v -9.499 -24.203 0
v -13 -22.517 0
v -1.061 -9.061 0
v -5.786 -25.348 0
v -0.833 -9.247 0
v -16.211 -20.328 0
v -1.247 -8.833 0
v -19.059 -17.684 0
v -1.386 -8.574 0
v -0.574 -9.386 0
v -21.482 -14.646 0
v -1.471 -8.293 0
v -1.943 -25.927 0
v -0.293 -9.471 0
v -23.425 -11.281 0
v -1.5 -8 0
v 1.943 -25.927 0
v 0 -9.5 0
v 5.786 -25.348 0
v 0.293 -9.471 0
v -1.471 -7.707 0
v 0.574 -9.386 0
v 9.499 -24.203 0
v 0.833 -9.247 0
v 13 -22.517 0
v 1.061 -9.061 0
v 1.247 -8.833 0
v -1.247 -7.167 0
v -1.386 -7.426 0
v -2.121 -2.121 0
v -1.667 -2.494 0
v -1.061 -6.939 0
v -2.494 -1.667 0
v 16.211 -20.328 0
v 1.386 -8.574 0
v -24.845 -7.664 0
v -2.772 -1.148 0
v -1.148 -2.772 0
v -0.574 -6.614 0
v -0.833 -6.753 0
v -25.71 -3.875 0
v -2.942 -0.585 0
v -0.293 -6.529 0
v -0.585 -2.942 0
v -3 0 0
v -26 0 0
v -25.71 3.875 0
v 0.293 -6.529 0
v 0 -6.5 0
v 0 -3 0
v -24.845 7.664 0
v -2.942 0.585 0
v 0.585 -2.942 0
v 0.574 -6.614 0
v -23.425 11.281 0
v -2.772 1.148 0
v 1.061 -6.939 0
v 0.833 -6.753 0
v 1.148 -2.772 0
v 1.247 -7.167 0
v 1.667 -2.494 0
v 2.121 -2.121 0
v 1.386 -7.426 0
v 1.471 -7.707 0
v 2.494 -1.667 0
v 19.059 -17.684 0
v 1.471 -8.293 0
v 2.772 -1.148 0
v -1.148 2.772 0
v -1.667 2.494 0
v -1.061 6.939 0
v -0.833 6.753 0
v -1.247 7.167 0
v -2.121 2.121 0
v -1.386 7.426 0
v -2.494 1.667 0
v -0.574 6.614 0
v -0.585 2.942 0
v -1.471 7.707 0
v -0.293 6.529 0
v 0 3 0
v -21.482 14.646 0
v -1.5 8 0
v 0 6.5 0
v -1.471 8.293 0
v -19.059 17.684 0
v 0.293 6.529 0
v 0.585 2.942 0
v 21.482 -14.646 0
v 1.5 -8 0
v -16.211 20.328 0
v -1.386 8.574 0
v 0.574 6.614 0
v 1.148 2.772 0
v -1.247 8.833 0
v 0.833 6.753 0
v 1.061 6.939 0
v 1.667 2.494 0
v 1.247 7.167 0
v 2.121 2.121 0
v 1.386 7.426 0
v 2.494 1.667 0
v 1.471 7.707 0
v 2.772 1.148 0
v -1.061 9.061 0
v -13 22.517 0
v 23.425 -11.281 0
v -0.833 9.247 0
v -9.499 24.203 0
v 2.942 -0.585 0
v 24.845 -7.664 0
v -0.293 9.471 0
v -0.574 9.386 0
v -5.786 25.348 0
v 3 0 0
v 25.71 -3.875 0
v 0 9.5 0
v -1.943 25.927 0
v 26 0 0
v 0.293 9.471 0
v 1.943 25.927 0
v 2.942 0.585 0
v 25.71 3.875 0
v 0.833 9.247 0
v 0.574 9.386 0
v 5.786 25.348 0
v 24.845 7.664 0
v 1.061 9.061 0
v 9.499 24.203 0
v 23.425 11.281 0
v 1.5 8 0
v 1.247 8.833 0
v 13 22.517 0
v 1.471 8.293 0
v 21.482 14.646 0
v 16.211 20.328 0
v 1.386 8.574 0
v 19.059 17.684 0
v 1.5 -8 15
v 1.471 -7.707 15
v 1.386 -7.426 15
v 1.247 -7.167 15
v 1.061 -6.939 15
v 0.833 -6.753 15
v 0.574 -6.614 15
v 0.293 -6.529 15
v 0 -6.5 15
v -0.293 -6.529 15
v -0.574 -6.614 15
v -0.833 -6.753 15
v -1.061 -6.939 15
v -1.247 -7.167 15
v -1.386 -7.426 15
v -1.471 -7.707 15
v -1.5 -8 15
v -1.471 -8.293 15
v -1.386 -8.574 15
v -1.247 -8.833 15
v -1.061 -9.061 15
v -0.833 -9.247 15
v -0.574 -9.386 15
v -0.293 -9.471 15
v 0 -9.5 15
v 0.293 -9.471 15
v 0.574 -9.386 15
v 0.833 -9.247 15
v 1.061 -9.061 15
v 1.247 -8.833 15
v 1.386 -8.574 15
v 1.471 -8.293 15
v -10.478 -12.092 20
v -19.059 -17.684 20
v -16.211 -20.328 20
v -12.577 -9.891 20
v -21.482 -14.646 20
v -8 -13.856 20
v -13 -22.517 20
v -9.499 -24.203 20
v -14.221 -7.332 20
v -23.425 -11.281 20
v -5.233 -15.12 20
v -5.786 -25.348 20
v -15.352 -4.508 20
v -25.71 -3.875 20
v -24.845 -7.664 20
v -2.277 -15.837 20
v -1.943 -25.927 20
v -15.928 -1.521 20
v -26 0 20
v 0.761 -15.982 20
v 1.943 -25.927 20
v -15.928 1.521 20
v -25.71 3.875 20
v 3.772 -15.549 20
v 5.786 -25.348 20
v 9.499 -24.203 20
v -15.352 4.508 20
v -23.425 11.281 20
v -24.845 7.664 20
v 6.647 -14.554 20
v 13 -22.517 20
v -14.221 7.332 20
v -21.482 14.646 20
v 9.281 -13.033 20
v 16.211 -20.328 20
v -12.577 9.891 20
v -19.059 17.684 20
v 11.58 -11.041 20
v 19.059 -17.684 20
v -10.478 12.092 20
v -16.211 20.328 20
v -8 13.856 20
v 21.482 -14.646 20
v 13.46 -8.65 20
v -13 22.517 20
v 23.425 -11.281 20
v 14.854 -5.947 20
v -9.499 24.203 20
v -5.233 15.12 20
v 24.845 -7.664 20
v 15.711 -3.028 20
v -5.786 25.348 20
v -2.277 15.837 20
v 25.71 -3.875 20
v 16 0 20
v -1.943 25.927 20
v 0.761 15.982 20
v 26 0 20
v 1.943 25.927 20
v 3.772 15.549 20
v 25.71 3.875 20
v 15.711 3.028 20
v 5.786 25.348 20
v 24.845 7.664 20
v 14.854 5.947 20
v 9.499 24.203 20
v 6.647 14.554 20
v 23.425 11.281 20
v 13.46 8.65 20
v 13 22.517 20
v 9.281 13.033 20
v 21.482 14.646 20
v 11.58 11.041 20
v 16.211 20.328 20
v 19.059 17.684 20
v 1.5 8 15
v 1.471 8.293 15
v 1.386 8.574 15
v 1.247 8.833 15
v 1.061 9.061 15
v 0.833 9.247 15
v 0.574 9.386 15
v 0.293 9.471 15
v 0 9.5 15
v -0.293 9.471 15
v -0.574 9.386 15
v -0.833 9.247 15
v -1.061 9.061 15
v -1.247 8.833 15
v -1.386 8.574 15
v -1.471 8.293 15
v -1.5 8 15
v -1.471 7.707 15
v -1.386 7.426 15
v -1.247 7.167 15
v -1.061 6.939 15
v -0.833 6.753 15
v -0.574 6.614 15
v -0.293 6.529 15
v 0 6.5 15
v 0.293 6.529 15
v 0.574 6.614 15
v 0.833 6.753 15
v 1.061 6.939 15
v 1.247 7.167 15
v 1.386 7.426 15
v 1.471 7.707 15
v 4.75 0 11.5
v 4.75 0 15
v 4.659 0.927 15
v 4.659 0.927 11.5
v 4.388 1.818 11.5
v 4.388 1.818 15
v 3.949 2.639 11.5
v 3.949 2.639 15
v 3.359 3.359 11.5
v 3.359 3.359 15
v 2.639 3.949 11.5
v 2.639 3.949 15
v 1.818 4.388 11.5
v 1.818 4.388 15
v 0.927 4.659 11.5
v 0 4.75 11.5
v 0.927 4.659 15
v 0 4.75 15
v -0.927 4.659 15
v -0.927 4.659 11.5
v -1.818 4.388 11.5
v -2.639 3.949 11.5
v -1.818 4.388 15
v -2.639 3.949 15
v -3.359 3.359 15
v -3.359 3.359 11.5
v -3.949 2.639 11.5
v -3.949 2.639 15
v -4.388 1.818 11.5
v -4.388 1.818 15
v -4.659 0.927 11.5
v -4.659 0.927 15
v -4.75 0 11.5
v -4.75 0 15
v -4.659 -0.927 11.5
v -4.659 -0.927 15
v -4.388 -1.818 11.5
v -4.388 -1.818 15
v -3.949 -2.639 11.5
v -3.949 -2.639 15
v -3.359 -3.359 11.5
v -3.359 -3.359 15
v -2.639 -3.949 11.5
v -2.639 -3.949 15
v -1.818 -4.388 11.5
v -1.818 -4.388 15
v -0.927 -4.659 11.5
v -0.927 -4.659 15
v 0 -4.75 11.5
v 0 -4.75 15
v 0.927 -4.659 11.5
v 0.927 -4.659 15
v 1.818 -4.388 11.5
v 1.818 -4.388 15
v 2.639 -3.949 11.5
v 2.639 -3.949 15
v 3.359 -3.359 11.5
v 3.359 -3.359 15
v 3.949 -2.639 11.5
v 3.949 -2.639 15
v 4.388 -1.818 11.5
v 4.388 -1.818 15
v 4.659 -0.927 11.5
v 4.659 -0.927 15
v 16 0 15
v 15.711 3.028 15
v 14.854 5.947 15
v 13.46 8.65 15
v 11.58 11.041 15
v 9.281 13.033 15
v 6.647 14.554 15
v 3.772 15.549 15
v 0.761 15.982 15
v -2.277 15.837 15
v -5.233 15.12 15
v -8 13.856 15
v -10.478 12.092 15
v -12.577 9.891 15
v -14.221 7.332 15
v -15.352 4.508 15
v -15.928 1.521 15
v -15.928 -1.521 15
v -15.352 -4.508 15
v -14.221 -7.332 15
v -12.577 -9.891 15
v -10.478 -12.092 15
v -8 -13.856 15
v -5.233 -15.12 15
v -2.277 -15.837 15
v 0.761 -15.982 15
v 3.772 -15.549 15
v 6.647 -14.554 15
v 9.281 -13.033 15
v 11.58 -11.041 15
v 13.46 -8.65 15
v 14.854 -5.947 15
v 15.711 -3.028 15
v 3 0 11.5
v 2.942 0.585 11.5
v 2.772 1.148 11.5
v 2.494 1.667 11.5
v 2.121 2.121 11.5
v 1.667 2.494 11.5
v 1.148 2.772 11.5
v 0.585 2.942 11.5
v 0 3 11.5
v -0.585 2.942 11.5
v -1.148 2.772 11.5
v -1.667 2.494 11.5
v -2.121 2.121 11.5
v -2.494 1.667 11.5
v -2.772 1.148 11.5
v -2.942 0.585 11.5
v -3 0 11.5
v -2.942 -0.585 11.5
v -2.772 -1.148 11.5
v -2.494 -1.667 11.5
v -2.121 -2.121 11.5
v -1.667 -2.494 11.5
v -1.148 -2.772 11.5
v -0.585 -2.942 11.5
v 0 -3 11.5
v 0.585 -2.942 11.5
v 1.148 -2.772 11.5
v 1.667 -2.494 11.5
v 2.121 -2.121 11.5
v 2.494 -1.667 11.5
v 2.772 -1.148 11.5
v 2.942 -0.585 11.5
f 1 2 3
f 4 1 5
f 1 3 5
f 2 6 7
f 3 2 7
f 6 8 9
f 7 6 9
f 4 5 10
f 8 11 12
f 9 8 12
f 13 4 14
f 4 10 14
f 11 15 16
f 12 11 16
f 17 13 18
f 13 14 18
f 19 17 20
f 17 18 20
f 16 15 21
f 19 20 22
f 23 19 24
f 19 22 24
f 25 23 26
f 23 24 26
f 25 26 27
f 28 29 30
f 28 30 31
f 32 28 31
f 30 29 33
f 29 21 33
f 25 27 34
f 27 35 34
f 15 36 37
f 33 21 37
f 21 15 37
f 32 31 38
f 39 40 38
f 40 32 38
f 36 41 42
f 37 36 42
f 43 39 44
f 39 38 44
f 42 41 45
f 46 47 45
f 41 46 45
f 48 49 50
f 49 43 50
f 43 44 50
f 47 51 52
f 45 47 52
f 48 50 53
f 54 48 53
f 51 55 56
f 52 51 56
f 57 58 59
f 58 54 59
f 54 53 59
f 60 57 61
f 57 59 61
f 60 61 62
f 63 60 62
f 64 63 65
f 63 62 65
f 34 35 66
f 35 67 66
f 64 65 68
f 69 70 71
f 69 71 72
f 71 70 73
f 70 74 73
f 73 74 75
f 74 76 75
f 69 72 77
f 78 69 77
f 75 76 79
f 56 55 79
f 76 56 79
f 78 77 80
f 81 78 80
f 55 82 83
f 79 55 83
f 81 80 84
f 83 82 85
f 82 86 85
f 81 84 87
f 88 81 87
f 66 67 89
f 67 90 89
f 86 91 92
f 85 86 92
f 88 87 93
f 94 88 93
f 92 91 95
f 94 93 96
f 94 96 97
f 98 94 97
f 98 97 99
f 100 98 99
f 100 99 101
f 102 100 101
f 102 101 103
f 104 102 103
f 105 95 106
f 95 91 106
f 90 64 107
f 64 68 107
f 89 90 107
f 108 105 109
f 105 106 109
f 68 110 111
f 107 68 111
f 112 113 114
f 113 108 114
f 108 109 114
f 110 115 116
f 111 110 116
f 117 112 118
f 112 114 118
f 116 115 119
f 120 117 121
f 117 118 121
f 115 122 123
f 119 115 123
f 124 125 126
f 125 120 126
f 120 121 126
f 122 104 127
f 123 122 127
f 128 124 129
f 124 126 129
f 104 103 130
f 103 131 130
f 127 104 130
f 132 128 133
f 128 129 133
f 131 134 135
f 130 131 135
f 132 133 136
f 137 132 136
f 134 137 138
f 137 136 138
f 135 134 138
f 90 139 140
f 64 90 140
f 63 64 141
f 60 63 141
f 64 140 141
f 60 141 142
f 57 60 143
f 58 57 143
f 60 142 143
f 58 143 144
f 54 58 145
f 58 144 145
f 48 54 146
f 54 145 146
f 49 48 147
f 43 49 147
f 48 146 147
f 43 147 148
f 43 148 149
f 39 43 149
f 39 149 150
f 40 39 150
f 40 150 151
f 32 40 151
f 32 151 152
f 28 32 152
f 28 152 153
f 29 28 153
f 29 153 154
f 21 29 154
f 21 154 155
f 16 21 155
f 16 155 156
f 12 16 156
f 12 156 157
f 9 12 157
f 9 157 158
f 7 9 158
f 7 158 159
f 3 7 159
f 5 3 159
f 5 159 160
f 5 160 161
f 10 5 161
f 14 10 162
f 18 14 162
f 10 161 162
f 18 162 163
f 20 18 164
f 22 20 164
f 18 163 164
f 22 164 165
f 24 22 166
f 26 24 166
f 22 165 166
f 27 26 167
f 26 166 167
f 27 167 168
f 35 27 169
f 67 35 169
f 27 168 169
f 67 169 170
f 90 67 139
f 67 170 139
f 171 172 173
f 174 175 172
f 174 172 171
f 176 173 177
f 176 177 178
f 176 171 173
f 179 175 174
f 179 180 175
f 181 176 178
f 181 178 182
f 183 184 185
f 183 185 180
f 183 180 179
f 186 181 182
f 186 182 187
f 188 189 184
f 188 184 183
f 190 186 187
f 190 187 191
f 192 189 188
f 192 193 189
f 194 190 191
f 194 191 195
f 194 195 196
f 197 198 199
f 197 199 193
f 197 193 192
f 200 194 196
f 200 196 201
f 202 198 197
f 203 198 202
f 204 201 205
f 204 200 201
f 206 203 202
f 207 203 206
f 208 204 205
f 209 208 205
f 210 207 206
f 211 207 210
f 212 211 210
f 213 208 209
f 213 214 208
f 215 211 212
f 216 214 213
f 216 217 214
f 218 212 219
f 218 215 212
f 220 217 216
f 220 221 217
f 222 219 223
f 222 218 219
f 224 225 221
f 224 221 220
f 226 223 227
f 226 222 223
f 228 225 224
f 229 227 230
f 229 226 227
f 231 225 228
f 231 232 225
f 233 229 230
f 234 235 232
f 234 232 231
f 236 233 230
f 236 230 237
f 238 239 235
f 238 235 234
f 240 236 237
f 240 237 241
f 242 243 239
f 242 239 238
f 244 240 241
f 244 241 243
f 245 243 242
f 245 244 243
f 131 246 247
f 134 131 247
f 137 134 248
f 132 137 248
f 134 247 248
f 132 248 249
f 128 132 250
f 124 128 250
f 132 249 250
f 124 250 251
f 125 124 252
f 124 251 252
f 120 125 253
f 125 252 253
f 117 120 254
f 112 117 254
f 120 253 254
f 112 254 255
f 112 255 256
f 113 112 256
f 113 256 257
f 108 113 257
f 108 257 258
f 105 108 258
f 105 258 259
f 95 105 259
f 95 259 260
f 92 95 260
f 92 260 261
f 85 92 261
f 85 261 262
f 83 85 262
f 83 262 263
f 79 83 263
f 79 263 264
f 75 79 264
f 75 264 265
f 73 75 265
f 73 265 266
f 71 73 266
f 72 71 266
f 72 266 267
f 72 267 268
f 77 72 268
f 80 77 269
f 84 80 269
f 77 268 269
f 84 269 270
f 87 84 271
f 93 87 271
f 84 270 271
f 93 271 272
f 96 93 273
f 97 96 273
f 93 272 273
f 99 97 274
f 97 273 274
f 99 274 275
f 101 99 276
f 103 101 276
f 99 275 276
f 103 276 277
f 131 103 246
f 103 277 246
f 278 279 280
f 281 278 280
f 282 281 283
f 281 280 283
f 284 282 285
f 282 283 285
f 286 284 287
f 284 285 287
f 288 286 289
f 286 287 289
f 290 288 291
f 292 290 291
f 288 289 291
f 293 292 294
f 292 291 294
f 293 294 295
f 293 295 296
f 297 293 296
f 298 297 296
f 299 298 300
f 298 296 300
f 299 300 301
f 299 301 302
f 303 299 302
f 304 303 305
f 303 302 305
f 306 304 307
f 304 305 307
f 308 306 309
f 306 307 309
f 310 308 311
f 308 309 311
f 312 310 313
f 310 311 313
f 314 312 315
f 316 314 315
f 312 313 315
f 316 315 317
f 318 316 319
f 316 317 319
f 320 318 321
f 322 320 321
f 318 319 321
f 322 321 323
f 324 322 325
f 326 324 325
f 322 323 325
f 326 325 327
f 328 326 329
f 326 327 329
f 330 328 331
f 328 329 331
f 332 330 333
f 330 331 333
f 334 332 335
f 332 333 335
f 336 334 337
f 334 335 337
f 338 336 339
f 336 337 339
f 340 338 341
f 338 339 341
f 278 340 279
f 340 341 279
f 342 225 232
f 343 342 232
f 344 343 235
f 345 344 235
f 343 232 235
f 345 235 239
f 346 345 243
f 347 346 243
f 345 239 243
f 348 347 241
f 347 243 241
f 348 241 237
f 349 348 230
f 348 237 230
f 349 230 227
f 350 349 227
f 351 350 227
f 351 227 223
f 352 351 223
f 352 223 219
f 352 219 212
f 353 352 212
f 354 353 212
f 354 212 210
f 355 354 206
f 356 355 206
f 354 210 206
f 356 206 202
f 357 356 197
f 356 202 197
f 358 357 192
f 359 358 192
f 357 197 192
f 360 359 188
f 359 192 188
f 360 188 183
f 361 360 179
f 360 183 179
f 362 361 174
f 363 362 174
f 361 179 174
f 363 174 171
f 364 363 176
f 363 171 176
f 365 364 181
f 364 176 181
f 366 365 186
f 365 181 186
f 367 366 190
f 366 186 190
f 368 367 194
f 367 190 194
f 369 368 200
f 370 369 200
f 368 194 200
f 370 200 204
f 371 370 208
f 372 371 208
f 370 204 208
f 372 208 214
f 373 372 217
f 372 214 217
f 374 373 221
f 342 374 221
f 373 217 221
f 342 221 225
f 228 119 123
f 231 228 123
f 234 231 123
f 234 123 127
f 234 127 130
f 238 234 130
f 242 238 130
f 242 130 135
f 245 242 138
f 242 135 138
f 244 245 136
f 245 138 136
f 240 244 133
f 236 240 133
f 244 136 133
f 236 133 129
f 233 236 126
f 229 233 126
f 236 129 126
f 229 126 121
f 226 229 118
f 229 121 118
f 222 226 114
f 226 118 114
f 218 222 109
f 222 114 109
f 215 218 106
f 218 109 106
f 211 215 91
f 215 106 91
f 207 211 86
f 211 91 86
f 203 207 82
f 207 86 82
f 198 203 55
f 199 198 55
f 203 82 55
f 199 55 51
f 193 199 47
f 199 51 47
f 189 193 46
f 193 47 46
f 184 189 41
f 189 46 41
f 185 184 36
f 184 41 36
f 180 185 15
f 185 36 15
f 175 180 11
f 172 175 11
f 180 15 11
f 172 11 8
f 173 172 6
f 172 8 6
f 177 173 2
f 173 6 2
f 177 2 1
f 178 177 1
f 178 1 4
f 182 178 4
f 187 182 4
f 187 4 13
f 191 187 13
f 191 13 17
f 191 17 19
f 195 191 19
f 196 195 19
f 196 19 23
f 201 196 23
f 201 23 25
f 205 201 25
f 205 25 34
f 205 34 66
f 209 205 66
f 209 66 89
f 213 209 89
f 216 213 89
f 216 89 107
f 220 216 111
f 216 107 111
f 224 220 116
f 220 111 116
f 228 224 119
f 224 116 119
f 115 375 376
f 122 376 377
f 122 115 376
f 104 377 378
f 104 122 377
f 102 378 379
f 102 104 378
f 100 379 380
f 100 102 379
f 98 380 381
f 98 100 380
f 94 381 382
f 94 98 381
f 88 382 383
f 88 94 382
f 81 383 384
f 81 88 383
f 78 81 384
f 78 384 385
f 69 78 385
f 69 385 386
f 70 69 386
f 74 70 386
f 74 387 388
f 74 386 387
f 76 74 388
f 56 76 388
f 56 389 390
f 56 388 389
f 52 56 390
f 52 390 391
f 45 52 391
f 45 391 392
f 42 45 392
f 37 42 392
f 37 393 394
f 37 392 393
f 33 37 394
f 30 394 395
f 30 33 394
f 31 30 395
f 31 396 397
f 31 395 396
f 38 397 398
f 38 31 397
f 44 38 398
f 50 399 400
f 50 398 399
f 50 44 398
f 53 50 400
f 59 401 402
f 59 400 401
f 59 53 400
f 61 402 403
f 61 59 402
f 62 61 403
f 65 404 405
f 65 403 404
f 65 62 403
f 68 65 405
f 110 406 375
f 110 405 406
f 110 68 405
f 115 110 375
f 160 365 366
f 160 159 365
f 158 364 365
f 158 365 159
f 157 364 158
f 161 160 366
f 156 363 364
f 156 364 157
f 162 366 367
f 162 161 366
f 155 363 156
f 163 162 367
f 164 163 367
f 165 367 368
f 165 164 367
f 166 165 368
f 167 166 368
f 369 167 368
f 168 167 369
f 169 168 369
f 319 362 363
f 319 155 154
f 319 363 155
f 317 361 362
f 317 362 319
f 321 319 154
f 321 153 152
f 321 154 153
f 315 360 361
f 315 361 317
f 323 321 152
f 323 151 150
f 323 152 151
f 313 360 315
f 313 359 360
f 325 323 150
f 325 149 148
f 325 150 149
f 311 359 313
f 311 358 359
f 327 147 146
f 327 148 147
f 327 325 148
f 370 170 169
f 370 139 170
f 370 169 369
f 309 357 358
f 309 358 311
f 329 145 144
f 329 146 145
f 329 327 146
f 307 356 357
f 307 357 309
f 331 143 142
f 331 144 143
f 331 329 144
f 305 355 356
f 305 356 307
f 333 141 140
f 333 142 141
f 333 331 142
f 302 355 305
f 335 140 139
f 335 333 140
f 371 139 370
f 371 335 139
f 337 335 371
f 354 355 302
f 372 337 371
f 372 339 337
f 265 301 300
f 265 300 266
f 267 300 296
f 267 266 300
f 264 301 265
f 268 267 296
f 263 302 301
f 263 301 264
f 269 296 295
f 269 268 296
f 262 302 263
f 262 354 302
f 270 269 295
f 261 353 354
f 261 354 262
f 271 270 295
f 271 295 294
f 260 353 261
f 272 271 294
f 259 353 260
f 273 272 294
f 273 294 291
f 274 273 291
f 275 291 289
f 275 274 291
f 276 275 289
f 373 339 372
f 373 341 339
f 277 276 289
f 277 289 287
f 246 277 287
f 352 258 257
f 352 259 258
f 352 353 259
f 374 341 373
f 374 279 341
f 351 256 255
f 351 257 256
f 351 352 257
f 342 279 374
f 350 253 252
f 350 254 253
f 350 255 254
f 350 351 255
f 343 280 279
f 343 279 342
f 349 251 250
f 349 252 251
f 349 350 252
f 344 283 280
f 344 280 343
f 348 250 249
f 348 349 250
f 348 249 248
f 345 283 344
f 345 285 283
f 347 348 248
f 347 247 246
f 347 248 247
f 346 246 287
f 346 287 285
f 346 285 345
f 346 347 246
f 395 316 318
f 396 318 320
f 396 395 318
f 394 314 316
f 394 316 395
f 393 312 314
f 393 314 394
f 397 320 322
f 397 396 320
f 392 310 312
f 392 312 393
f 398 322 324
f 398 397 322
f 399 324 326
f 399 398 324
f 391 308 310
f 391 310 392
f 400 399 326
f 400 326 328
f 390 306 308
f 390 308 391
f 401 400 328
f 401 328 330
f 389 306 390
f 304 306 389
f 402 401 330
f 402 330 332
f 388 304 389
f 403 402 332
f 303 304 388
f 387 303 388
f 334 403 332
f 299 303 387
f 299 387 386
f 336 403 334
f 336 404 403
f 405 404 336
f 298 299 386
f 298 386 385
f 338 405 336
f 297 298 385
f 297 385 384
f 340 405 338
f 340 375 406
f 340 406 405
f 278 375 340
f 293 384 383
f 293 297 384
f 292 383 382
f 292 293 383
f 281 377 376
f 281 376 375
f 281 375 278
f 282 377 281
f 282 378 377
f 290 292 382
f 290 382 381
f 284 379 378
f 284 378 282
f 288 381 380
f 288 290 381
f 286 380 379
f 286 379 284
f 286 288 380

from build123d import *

# Parameters (mm, degrees)
ESQUISSE1_R             = 26
ESQUISSE1_R_2           = 3
BOSS_EXTRU_1_DEPTH      = 20
ESQUISSE2_R             = 16
ENL_V_MAT_EXTRU_1_DEPTH = 5
ESQUISSE3_R             = 4.75
ENL_V_MAT_EXTRU_2_DEPTH = 3.5
ESQUISSE4_R             = 1.5
ENL_V_MAT_EXTRU_3_DEPTH = 16


with BuildPart() as part:
    # Esquisse1 → Boss.-Extru.1 (new body)
    with BuildSketch(Plane.XY):
        Circle(ESQUISSE1_R)
        Circle(ESQUISSE1_R_2, mode=Mode.SUBTRACT)
    extrude(amount=BOSS_EXTRU_1_DEPTH)

    # Esquisse2 → Enlèv. mat.-Extru.1 (cut)
    with BuildSketch(Plane.XY.offset(20)):
        Circle(ESQUISSE2_R)
    extrude(amount=-ENL_V_MAT_EXTRU_1_DEPTH, mode=Mode.SUBTRACT)

    # Esquisse3 → Enlèv. mat.-Extru.2 (cut)
    with BuildSketch(Plane.XY.offset(15)):
        Circle(ESQUISSE3_R)
    extrude(amount=-ENL_V_MAT_EXTRU_2_DEPTH, mode=Mode.SUBTRACT)

    # Esquisse4 → Enlèv. mat.-Extru.3 (cut, through all)
    with BuildSketch(Plane.XY.offset(15)):
        with Locations((0, 8)):
            Circle(ESQUISSE4_R)
        with Locations((0, -8)):
            Circle(ESQUISSE4_R)
    extrude(amount=-ENL_V_MAT_EXTRU_3_DEPTH, mode=Mode.SUBTRACT)


solid = part.part
